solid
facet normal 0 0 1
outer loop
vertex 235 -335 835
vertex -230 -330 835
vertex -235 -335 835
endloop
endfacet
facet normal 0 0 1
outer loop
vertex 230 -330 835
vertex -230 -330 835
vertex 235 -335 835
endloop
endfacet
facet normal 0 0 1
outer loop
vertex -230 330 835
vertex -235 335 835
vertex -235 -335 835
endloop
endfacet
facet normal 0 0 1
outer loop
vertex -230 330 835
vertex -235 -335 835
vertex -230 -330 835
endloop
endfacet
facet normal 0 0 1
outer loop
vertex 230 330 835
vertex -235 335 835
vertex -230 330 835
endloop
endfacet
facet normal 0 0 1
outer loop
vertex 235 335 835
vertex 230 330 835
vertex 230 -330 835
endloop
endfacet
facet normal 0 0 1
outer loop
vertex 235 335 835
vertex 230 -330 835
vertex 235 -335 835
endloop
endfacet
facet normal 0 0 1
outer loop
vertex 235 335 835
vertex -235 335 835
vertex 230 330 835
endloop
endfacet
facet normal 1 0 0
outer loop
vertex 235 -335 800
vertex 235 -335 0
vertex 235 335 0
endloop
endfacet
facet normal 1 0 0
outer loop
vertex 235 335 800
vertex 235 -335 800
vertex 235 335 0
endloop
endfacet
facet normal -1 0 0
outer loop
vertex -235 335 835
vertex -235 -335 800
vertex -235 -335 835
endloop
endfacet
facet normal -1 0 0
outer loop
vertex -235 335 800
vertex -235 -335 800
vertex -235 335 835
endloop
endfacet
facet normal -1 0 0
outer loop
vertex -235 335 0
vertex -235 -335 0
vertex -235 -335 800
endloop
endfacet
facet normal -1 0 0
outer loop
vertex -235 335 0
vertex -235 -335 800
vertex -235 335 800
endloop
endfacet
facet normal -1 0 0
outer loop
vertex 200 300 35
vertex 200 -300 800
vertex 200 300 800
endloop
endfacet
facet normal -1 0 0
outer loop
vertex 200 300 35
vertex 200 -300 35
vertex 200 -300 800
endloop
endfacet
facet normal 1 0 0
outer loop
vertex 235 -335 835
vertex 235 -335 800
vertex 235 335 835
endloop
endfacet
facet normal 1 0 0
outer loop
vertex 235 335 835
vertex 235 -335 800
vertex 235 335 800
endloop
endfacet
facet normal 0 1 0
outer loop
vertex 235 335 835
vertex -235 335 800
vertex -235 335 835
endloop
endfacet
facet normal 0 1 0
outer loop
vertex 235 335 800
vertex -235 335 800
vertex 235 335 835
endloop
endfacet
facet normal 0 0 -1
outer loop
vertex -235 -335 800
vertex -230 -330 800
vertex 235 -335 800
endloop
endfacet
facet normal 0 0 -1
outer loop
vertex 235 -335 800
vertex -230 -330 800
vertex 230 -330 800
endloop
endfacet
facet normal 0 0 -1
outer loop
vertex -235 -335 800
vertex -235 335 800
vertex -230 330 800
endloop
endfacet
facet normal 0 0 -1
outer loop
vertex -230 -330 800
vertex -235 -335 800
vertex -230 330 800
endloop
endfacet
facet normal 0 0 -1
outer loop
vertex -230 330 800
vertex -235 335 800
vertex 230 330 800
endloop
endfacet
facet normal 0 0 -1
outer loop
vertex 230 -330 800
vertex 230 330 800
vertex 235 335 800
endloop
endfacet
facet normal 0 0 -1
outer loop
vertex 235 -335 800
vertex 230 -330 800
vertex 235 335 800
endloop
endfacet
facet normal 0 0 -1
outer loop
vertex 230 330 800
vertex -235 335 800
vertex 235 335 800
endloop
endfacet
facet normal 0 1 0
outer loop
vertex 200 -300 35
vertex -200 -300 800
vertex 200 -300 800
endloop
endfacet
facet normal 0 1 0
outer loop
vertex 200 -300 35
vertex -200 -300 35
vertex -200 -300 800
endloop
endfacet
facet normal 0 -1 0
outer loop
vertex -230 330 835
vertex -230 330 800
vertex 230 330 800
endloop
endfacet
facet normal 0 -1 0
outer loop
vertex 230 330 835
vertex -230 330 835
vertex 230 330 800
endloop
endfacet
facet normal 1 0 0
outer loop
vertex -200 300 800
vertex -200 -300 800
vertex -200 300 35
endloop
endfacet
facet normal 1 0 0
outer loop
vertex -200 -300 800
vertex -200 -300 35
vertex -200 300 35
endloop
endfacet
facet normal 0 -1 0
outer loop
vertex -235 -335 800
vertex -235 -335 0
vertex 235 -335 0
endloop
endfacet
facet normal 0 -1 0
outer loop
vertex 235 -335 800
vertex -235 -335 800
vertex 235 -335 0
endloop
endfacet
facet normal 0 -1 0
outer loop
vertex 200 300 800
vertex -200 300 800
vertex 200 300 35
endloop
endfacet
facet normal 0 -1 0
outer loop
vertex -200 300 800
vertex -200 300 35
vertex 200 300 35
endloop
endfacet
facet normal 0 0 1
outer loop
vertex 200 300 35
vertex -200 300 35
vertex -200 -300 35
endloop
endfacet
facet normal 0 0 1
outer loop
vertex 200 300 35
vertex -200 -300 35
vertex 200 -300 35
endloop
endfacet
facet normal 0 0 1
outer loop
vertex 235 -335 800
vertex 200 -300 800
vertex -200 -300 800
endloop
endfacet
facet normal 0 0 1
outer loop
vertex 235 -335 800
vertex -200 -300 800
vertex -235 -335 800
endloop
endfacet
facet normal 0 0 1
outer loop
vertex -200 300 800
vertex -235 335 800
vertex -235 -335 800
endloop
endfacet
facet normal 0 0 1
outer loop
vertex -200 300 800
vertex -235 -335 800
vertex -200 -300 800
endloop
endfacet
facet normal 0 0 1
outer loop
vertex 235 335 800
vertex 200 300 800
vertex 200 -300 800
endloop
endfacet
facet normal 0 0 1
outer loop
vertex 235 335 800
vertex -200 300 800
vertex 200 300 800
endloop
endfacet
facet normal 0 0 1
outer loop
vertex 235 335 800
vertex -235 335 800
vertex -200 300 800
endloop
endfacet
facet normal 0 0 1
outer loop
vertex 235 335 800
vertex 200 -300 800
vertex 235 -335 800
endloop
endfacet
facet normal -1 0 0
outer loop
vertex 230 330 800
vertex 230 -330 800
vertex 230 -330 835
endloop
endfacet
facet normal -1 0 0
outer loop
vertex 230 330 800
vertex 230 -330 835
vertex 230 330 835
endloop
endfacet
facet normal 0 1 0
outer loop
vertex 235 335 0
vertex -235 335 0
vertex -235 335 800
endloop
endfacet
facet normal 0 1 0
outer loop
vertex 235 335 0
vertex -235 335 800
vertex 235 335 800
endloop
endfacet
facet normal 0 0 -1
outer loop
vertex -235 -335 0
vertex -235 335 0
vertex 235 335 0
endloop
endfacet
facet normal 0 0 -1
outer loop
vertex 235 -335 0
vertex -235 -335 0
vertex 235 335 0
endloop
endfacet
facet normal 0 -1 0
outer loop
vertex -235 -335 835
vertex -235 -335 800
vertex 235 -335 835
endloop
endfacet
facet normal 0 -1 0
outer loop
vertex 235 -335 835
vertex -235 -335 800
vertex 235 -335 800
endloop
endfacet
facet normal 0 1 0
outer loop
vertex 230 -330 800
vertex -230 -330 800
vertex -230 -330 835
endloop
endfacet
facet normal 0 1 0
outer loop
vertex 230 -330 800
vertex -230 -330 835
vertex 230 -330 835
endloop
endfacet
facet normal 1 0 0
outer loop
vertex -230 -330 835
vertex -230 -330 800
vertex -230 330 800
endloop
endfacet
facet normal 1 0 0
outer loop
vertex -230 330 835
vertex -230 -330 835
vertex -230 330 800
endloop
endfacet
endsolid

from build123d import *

# Parameters (mm, degrees)
F0_W     = 470
F0_H     = 670
F1_DEPTH = 800
F2_T     = -35
F3_W     = 470
F3_H     = 670
F3_W_2   = 460
F3_H_2   = 660
F4_DEPTH = 35


with BuildPart() as f1:
    # F0 (on Top) → F1 (new body)
    with BuildSketch(Plane.XY):
        Rectangle(F0_W, F0_H)
    extrude(amount=F1_DEPTH)

    # F2
    f2_openings = [f1.faces().sort_by_distance(p)[0] for p in [
        (0, 0, 800),
    ]]
    offset(amount=F2_T, openings=f2_openings)


with BuildPart() as f4:
    # F3 (on face) → F4 (new body)
    with BuildSketch(Plane.XY.offset(800)):
        Rectangle(F3_W, F3_H)
        Rectangle(F3_W_2, F3_H_2, mode=Mode.SUBTRACT)
    extrude(amount=F4_DEPTH)


solid = Compound([f1.part, f4.part])
